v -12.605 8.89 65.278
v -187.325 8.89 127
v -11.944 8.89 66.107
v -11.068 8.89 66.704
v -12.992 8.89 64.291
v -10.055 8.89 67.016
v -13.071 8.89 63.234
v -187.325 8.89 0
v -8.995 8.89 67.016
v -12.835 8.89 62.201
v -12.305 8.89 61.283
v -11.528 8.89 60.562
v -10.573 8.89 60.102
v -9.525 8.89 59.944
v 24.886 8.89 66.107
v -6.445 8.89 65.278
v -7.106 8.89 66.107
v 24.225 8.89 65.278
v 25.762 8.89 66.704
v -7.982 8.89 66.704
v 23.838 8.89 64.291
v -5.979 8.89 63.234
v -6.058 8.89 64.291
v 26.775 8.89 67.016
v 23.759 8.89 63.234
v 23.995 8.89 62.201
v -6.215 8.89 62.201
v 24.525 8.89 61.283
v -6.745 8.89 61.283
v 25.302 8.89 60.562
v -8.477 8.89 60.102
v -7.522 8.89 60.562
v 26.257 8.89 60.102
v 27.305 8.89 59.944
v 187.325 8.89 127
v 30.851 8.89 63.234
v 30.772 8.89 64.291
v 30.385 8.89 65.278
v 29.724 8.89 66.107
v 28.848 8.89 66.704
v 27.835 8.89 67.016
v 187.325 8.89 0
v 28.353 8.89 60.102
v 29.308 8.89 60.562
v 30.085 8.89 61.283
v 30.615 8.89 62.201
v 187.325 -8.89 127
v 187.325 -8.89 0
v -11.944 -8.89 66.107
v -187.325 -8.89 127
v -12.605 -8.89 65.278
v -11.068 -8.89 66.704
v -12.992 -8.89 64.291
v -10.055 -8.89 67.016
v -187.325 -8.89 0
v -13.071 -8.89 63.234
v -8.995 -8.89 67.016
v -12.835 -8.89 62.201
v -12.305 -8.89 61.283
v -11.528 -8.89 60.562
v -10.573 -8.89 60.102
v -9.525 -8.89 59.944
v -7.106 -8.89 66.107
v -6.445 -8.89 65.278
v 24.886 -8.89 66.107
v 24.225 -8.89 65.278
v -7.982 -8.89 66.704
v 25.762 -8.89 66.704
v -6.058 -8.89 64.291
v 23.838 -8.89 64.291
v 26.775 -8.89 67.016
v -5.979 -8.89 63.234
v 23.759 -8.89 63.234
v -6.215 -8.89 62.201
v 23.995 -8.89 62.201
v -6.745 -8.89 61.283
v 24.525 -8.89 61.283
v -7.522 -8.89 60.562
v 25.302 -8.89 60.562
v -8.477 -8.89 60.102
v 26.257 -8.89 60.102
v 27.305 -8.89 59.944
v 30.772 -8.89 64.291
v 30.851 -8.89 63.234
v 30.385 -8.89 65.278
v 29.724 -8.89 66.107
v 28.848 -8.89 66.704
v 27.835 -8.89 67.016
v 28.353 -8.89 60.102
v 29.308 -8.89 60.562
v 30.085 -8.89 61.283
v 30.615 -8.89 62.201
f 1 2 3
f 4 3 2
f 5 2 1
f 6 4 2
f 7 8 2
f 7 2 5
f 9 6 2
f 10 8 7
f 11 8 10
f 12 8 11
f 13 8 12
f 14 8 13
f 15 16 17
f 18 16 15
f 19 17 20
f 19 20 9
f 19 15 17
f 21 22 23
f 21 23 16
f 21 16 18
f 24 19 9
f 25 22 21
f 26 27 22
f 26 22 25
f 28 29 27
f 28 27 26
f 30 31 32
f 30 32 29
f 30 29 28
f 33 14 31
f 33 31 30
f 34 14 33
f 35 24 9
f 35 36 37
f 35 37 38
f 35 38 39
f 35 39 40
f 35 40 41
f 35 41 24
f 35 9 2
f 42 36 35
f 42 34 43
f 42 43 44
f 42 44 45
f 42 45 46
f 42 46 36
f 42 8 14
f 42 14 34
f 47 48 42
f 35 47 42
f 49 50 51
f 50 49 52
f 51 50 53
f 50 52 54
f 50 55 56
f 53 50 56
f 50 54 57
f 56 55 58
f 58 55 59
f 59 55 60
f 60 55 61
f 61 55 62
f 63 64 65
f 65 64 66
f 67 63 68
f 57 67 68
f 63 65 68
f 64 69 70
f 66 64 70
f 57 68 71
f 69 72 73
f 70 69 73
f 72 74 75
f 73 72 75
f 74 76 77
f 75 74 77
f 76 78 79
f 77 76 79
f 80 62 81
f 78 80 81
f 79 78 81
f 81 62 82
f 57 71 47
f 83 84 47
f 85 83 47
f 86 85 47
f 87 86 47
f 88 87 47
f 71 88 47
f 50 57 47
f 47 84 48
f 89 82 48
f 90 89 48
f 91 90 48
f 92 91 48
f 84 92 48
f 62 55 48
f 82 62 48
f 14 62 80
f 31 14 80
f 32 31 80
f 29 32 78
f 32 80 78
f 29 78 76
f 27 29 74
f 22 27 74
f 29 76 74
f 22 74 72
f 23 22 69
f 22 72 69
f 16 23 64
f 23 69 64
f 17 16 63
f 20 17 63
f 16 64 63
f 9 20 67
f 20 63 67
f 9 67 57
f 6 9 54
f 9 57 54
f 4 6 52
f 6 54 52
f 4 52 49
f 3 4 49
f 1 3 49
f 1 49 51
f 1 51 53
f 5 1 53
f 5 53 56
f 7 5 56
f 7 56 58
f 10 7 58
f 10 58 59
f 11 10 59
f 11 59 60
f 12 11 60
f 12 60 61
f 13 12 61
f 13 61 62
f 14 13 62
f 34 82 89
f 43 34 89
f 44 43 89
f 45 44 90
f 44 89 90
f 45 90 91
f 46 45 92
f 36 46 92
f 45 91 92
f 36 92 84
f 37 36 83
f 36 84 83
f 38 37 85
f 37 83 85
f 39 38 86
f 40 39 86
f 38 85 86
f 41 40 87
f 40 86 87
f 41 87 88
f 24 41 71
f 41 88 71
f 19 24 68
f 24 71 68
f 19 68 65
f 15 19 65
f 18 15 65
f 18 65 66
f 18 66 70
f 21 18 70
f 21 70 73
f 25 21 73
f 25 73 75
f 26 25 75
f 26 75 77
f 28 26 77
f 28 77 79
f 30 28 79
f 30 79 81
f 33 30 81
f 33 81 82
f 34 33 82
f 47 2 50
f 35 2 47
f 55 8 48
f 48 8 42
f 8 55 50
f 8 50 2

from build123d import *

# Parameters (mm, degrees)
SKETCH1_W           = 374.65
SKETCH1_H           = 17.78
BOSS_EXTRUDE1_DEPTH = 127
SKETCH2_R           = 3.556
CUT_EXTRUDE1_DEPTH  = 228.014942295


with BuildPart() as part:
    # Sketch1 → Boss-Extrude1 (new body)
    with BuildSketch(Plane.XY):
        Rectangle(SKETCH1_W, SKETCH1_H)
    extrude(amount=BOSS_EXTRUDE1_DEPTH)

    # Sketch2 → Cut-Extrude1 (cut, through all)
    with BuildSketch(Plane.XZ.offset(8.89)):
        with Locations(Location((-9.525, 63.5, 0), (0, 0, 270))):
            Circle(SKETCH2_R)
        with Locations(Location((27.305, 63.5, 0), (0, 0, 270))):
            Circle(SKETCH2_R)
    extrude(amount=-CUT_EXTRUDE1_DEPTH, mode=Mode.SUBTRACT)


solid = part.part
